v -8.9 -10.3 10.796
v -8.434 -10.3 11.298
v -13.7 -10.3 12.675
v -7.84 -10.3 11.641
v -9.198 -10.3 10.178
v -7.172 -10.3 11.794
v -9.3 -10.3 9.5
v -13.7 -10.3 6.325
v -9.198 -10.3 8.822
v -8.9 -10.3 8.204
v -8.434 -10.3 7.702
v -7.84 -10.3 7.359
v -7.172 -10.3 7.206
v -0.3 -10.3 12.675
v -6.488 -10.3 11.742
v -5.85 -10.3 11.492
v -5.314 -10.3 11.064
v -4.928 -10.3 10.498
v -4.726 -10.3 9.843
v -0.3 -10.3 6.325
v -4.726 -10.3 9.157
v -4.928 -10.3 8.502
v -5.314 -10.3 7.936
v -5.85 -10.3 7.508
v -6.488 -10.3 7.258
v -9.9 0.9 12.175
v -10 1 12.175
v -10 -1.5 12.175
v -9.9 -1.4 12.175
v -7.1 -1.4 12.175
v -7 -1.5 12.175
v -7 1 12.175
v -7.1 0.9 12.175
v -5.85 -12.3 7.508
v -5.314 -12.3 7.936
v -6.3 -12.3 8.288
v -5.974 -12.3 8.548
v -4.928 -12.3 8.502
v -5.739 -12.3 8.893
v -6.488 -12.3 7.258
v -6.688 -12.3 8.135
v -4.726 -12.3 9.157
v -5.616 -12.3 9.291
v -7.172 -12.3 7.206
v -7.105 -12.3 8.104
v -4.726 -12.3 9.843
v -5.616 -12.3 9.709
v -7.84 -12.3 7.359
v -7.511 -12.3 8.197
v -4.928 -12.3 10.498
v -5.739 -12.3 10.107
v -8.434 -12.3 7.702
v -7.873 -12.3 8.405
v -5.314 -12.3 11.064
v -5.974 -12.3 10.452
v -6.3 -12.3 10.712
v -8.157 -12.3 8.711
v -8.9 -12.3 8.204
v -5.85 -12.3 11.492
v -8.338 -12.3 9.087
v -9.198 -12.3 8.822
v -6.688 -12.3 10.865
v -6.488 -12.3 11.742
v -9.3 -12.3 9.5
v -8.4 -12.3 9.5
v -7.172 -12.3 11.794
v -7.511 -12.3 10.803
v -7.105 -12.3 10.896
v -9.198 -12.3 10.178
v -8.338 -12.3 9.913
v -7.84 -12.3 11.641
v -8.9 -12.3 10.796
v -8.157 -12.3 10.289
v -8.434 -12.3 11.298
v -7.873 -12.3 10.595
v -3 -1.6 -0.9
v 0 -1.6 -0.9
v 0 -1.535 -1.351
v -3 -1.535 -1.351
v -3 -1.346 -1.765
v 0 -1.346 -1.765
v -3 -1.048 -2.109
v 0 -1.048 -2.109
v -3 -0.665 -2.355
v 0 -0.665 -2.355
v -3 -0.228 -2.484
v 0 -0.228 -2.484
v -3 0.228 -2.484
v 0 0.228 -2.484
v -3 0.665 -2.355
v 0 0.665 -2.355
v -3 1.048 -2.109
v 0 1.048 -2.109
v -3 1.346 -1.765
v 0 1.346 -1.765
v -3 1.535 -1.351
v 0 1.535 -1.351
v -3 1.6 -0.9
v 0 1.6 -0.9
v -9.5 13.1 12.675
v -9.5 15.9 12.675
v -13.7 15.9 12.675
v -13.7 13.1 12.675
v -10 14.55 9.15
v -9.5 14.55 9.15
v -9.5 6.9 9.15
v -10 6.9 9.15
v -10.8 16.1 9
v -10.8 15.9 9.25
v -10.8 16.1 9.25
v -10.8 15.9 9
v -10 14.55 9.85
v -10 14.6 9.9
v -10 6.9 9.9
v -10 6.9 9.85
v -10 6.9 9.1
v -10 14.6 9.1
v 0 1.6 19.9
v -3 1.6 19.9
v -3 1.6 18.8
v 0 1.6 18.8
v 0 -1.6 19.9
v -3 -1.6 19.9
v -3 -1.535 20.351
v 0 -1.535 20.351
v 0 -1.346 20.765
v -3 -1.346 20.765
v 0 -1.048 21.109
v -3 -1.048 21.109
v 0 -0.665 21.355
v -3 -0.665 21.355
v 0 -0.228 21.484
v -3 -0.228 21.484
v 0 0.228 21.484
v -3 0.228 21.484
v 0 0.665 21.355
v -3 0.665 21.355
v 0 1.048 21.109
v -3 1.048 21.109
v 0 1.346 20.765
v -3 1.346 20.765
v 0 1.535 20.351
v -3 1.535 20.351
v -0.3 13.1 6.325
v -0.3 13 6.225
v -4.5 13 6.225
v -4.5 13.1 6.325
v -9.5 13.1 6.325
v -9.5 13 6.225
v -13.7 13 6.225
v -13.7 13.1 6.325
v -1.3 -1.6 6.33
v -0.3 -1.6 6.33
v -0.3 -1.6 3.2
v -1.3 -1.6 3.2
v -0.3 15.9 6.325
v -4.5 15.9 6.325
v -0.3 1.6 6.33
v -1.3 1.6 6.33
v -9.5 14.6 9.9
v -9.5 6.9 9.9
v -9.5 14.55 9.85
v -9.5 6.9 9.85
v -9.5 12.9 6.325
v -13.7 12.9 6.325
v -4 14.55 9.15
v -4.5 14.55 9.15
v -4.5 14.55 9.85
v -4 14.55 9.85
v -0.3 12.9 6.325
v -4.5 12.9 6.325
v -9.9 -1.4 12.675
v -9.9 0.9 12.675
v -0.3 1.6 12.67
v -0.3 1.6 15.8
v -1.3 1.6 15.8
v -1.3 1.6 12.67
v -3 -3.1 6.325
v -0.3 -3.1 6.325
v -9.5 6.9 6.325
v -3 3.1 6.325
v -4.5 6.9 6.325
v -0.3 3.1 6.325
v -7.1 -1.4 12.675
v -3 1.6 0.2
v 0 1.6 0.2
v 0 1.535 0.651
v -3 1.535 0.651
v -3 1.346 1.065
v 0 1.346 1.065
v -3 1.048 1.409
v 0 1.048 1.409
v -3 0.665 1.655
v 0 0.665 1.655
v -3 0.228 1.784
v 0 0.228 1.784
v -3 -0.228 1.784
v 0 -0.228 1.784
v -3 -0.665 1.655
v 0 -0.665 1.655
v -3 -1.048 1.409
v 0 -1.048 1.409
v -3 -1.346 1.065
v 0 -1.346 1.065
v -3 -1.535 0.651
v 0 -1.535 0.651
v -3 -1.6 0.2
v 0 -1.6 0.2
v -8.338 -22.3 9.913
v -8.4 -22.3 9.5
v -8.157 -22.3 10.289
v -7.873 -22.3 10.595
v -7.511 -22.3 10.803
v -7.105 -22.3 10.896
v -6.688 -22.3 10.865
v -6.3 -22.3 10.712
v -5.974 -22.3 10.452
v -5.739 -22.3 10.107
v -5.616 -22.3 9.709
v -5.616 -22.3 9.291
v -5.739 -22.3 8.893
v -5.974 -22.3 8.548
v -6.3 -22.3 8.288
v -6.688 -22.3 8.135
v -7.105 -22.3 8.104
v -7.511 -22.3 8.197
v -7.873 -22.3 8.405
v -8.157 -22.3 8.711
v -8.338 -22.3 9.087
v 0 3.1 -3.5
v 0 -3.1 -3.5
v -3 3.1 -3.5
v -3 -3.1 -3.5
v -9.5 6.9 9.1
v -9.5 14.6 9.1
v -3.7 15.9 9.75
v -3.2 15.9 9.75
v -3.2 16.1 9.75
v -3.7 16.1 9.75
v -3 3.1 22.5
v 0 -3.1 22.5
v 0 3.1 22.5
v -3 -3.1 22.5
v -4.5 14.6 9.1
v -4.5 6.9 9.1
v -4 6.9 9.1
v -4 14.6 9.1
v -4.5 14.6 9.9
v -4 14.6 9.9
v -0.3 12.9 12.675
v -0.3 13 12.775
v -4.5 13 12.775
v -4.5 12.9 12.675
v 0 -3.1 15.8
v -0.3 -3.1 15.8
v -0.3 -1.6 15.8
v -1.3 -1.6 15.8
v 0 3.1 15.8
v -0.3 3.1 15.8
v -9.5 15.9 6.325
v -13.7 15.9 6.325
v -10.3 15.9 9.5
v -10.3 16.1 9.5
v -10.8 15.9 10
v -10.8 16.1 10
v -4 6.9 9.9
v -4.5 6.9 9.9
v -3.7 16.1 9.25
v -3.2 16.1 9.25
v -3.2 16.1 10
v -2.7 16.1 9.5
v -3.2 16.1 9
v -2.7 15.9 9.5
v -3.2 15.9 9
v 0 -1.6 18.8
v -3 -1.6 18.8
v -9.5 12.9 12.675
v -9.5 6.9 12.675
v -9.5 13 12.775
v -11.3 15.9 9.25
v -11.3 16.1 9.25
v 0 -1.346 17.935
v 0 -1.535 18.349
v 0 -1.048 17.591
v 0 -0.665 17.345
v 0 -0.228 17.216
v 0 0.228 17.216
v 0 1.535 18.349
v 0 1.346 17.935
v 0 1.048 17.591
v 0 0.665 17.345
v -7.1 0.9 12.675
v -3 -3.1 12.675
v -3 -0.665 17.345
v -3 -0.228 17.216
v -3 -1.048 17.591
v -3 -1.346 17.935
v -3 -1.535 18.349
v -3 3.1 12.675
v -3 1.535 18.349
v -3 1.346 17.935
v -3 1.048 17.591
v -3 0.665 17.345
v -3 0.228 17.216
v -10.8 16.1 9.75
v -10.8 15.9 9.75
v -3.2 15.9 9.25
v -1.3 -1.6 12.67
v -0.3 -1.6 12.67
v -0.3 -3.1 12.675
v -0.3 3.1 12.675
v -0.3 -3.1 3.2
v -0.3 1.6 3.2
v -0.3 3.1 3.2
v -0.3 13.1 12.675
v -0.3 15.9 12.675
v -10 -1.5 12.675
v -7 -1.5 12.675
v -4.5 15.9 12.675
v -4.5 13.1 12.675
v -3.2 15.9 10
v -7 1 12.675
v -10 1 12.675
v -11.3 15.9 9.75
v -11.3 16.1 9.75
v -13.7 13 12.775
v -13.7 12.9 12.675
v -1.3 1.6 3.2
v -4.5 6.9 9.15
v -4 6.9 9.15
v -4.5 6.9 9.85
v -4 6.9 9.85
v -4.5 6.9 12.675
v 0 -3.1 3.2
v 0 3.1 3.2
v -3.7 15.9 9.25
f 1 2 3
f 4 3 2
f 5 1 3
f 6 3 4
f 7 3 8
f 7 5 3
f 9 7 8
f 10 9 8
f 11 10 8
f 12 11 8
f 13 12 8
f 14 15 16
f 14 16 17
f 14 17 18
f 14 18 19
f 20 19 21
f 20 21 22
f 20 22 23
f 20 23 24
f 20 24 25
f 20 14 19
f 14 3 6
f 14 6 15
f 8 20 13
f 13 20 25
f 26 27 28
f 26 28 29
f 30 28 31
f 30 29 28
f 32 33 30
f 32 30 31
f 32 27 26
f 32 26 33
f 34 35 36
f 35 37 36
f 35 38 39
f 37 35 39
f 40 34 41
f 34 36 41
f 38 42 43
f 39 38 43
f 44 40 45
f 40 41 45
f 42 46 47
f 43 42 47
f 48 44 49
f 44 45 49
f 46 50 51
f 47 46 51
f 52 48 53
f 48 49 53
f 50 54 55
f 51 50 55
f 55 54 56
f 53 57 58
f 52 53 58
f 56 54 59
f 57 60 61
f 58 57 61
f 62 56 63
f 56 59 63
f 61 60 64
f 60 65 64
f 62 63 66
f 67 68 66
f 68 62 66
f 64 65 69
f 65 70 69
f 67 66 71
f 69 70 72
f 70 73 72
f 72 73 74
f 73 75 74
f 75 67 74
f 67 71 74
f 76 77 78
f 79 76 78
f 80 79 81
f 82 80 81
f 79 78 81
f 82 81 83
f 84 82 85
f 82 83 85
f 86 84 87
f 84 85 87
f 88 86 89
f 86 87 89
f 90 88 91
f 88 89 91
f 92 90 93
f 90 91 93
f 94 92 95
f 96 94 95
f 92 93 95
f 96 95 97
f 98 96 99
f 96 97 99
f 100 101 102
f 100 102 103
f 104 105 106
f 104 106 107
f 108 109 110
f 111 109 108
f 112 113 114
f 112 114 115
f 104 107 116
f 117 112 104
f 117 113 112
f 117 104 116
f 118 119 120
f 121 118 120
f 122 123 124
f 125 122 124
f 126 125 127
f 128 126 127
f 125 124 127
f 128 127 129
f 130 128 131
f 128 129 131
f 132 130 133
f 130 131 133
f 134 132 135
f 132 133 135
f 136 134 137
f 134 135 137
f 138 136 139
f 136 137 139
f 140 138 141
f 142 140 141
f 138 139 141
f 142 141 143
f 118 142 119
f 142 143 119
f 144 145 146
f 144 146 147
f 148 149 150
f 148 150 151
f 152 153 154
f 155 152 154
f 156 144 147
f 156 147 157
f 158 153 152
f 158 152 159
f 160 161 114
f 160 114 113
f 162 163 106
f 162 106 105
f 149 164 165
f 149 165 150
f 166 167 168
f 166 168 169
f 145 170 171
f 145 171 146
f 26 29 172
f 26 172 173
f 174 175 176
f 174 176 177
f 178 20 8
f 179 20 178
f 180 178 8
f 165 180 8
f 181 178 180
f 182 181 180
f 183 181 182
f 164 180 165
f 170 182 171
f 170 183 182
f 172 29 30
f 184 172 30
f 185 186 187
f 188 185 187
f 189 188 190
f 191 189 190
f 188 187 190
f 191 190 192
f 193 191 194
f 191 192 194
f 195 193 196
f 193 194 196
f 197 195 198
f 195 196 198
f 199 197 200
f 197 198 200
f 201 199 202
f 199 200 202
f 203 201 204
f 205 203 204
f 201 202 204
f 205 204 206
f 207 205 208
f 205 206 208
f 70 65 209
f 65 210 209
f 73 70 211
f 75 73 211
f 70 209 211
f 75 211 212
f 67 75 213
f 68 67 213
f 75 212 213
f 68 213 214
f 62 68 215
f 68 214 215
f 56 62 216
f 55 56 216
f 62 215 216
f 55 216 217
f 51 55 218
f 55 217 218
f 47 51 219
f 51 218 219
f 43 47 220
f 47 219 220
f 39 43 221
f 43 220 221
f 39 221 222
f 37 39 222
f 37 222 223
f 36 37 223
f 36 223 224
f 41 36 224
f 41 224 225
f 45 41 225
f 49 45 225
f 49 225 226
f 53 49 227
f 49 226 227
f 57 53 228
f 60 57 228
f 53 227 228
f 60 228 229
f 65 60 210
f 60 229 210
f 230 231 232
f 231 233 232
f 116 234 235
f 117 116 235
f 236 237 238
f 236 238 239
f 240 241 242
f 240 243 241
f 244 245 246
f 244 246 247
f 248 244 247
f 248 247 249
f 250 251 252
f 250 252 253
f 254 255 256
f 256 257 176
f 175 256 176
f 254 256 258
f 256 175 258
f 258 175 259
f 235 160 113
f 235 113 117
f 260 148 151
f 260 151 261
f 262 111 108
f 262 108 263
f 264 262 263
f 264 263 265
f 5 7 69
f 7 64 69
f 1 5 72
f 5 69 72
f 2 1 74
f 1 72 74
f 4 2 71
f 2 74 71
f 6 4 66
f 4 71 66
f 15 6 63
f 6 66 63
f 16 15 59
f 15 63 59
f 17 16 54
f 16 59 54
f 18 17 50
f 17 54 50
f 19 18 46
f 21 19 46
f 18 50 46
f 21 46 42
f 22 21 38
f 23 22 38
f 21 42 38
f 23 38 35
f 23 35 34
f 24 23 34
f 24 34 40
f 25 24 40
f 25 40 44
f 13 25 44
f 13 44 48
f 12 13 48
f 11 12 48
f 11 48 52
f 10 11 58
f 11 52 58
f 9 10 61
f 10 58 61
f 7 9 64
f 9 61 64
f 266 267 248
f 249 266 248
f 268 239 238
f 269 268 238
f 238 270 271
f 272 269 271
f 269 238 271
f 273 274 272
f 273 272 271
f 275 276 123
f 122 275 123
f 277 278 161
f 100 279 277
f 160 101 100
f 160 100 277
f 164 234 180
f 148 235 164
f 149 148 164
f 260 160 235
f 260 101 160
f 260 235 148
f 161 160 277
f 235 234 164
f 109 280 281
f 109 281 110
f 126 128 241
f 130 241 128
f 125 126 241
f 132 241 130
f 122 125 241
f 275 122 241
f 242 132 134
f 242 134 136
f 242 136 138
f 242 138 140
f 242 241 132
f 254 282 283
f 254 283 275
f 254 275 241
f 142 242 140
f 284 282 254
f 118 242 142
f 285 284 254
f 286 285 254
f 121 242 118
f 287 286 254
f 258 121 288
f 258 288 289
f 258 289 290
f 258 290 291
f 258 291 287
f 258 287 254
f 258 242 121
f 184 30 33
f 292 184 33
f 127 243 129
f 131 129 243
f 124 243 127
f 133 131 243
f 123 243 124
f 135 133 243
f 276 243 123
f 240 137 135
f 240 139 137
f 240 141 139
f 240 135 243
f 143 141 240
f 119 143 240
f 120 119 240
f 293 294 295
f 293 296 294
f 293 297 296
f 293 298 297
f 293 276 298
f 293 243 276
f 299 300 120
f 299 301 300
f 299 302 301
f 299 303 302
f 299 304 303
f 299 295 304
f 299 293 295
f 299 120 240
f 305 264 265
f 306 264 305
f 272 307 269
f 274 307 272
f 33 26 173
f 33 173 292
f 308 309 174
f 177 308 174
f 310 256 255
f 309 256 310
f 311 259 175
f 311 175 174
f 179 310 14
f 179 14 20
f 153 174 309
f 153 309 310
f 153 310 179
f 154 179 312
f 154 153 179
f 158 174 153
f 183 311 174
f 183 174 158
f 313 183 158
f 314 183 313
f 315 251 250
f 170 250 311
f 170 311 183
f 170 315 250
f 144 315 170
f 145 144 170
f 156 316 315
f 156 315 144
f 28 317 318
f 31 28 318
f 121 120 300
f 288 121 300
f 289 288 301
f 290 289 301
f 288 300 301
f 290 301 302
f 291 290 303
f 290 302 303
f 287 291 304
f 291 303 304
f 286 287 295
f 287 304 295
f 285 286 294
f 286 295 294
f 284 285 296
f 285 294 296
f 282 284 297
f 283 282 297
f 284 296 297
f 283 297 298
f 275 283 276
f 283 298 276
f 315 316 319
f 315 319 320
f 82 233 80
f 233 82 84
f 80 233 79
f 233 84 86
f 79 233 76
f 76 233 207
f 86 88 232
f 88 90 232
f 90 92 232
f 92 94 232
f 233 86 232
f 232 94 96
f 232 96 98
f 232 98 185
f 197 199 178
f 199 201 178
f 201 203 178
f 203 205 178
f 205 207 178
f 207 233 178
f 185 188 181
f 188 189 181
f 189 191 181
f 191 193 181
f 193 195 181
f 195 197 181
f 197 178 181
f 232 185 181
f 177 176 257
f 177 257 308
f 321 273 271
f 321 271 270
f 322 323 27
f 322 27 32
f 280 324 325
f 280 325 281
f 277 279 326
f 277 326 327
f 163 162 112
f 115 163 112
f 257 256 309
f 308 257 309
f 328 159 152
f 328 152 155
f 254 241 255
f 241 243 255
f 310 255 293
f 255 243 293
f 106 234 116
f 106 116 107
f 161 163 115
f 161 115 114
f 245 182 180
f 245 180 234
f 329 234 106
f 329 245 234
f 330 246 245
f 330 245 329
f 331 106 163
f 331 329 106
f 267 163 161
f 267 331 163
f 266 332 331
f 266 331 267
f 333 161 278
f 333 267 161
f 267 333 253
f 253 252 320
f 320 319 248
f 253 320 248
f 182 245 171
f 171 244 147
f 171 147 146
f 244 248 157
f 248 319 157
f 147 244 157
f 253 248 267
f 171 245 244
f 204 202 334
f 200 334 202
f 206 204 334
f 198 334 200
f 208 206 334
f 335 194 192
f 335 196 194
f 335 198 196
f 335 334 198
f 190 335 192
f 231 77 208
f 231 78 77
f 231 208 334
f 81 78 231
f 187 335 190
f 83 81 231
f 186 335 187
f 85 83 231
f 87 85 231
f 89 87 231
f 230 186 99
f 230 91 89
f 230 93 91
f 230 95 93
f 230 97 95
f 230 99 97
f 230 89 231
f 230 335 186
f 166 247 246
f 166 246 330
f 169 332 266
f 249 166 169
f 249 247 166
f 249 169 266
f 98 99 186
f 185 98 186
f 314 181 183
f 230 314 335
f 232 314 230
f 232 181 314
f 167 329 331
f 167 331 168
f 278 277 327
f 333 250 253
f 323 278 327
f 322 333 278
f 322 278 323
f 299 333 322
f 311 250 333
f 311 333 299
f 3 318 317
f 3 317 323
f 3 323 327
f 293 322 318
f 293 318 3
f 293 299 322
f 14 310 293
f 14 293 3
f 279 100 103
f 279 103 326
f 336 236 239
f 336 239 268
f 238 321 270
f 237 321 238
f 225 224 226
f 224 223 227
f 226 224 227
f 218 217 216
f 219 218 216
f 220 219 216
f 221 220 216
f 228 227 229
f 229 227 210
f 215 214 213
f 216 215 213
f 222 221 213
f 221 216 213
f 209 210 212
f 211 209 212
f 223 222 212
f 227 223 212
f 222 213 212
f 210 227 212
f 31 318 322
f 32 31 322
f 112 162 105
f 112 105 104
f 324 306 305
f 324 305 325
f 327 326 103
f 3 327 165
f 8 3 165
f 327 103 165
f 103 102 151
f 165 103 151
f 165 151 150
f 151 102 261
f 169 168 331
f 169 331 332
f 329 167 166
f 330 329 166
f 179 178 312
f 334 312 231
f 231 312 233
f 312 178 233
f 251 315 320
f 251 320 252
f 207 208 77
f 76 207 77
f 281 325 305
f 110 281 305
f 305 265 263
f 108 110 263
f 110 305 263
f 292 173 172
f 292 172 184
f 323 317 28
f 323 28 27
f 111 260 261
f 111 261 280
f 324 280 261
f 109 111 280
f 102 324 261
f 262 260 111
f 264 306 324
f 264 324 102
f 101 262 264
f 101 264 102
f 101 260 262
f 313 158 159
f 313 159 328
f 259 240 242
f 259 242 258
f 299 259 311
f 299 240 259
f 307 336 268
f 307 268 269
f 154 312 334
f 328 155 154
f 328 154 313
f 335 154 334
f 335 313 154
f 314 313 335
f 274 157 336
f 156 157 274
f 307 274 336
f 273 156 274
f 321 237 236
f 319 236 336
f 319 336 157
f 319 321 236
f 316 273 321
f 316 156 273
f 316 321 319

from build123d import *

# Parameters (mm, degrees)
BOSS_EXTRUDE1_DEPTH  = 4.2
SKETCH2_W            = 6.35
SKETCH2_H            = 17.2
BOSS_EXTRUDE2_DEPTH  = 5
BOSS_EXTRUDE3_DEPTH  = 4.2
SKETCH4_W            = 0.8
SKETCH4_H            = 7.7
CUT_EXTRUDE1_DEPTH   = 0.5
SKETCH5_W            = 0.8
SKETCH5_H            = 7.7
CUT_EXTRUDE2_DEPTH   = 0.5
SKETCH6_W            = 2.7
SKETCH6_H            = 6.2
BOSS_EXTRUDE4_DEPTH  = 9.825
SKETCH7_W            = 6.7
SKETCH7_H            = 6.2
BOSS_EXTRUDE5_DEPTH  = 0.3
SKETCH8_W            = 3.13
SKETCH8_H            = 3.2
CUT_EXTRUDE3_DEPTH   = 1
SKETCH9_W            = 2.7
SKETCH9_H            = 6.2
BOSS_EXTRUDE6_DEPTH  = 9.825
SKETCH10_W           = 6.7
SKETCH10_H           = 6.2
BOSS_EXTRUDE7_DEPTH  = 0.3
SKETCH11_W           = 3.13
SKETCH11_H           = 3.2
CUT_EXTRUDE4_DEPTH   = 1
CUT_EXTRUDE5_DEPTH   = 30.55587928
CUT_EXTRUDE6_DEPTH   = 31.769302885
BOSS_EXTRUDE8_DEPTH  = 0.2
BOSS_EXTRUDE9_DEPTH  = 0.2
SKETCH16_W           = 3
SKETCH16_H           = 2.5
CUT_EXTRUDE7_DEPTH   = 0.5
SKETCH17_W           = 2.8
SKETCH17_H           = 2.3
BOSS_EXTRUDE10_DEPTH = 0.5
RIB1_START           = -0.35
RIB1_OUTLINE_W       = 0.5
RIB1_OUTLINE_H       = 7.65
RIB1_DEPTH           = 0.7
RIB2_START           = -0.35
RIB2_OUTLINE_W       = 0.5
RIB2_OUTLINE_H       = 7.65
RIB2_DEPTH           = 0.7


# Read off the part's stored shape, not the designer's step: Rib1, Rib2
with BuildPart() as part:
    # Sketch1 → Boss-Extrude1 (new body)
    with BuildSketch(Plane(origin=(-0.3, 0, 0), x_dir=(0, 0, -1), z_dir=(1, 0, 0))):
        Polygon((-12.775, 13), (-12.675, 12.9), (-12.675, -10.3), (-6.325, -10.3), (-6.325, 12.9), (-6.225, 13), (-6.325, 13.1), (-6.325, 15.9), (-12.675, 15.9), (-12.675, 13.1), align=None)
    extrude(amount=-BOSS_EXTRUDE1_DEPTH)

    # Sketch2 → Boss-Extrude2 (add)
    with BuildSketch(Plane.ZY.offset(4.5)):
        with Locations((9.5, -1.7)):
            Rectangle(SKETCH2_W, SKETCH2_H)
    extrude(amount=BOSS_EXTRUDE2_DEPTH)

    # Sketch3 → Boss-Extrude3 (add)
    with BuildSketch(Plane.ZY.offset(9.5)):
        Polygon((6.325, 13.1), (6.325, 15.9), (12.675, 15.9), (12.675, 13.1), (12.775, 13), (12.675, 12.9), (12.675, -10.3), (6.325, -10.3), (6.325, 12.9), (6.225, 13), align=None)
    extrude(amount=BOSS_EXTRUDE3_DEPTH)

    # Sketch4 → Cut-Extrude1 (cut)
    with BuildSketch(Plane(origin=(-9.5, 0, 0), x_dir=(0, 0, -1), z_dir=(1, 0, 0))):
        with Locations((-9.5, 10.75)):
            Rectangle(SKETCH4_W, SKETCH4_H)
    extrude(amount=-CUT_EXTRUDE1_DEPTH, mode=Mode.SUBTRACT)

    # Sketch5 → Cut-Extrude2 (cut)
    with BuildSketch(Plane.ZY.offset(4.5)):
        with Locations((9.5, 10.75)):
            Rectangle(SKETCH5_W, SKETCH5_H)
    extrude(amount=-CUT_EXTRUDE2_DEPTH, mode=Mode.SUBTRACT)

    # Sketch6 → Boss-Extrude4 (add)
    with BuildSketch(Plane.XY.offset(12.675)):
        with Locations((-1.65, 0)):
            Rectangle(SKETCH6_W, SKETCH6_H)
    extrude(amount=BOSS_EXTRUDE4_DEPTH)

    # Sketch7 → Boss-Extrude5 (add)
    with BuildSketch(Plane(origin=(-0.3, 0, 0), x_dir=(0, 0, -1), z_dir=(1, 0, 0))):
        with Locations((-19.15, 0)):
            Rectangle(SKETCH7_W, SKETCH7_H)
    extrude(amount=BOSS_EXTRUDE5_DEPTH)

    # Sketch8 → Cut-Extrude3 (cut)
    with BuildSketch(Plane(origin=(-0.3, 0, 0), x_dir=(0, 0, -1), z_dir=(1, 0, 0))):
        with Locations((-14.235, 0)):
            Rectangle(SKETCH8_W, SKETCH8_H)
    extrude(amount=-CUT_EXTRUDE3_DEPTH, mode=Mode.SUBTRACT)

    # Sketch9 → Boss-Extrude6 (add)
    with BuildSketch(Plane(origin=(0, 0, 6.325), x_dir=(-1, 0, 0), z_dir=(0, 0, -1))):
        with Locations((1.65, 0)):
            Rectangle(SKETCH9_W, SKETCH9_H)
    extrude(amount=BOSS_EXTRUDE6_DEPTH)

    # Sketch10 → Boss-Extrude7 (add)
    with BuildSketch(Plane(origin=(-0.3, 0, 0), x_dir=(0, 0, -1), z_dir=(1, 0, 0))):
        with Locations((0.15, 0)):
            Rectangle(SKETCH10_W, SKETCH10_H)
    extrude(amount=BOSS_EXTRUDE7_DEPTH)

    # Sketch11 → Cut-Extrude4 (cut)
    with BuildSketch(Plane(origin=(-0.3, 0, 0), x_dir=(0, 0, -1), z_dir=(1, 0, 0))):
        with Locations((-4.765, 0)):
            Rectangle(SKETCH11_W, SKETCH11_H)
    extrude(amount=-CUT_EXTRUDE4_DEPTH, mode=Mode.SUBTRACT)

    # Sketch12 → Cut-Extrude5 (cut, through all)
    with BuildSketch(Plane.ZY.offset(3)):
        with BuildLine():
            Line((18.8, -1.6), (19.9, -1.6))
            ThreePointArc((19.9, -1.6), (21.5, 0), (19.9, 1.6))
            Line((19.9, 1.6), (18.8, 1.6))
            ThreePointArc((18.8, 1.6), (17.2, 0), (18.8, -1.6))
        make_face()
    extrude(amount=-CUT_EXTRUDE5_DEPTH, mode=Mode.SUBTRACT)

    # Sketch13 → Cut-Extrude6 (cut, through all)
    with BuildSketch(Plane(origin=(0, 0, 0), x_dir=(0, 0, -1), z_dir=(1, 0, 0))):
        with BuildLine():
            Line((-0.2, -1.6), (0.9, -1.6))
            ThreePointArc((0.9, -1.6), (2.5, 0), (0.9, 1.6))
            Line((0.9, 1.6), (-0.2, 1.6))
            ThreePointArc((-0.2, 1.6), (-1.8, 0), (-0.2, -1.6))
        make_face()
    extrude(amount=-CUT_EXTRUDE6_DEPTH, mode=Mode.SUBTRACT)

    # Sketch14 → Boss-Extrude8 (add)
    with BuildSketch(Plane(origin=(0, 15.9, 0), x_dir=(-1, 0, 0), z_dir=(0, 1, 0))):
        Polygon((10.8, 10), (10.8, 9.75), (11.3, 9.75), (11.3, 9.25), (10.8, 9.25), (10.8, 9), (10.3, 9.5), align=None)
    extrude(amount=BOSS_EXTRUDE8_DEPTH)

    # Sketch15 → Boss-Extrude9 (add)
    with BuildSketch(Plane(origin=(0, 15.9, 0), x_dir=(-1, 0, 0), z_dir=(0, 1, 0))):
        Polygon((3.2, 10), (3.2, 9.75), (3.7, 9.75), (3.7, 9.25), (3.2, 9.25), (3.2, 9), (2.7, 9.5), align=None)
    extrude(amount=BOSS_EXTRUDE9_DEPTH)

    # Sketch16 → Cut-Extrude7 (cut)
    with BuildSketch(Plane.XY.offset(12.675)):
        with Locations((-8.5, -0.25)):
            Rectangle(SKETCH16_W, SKETCH16_H)
    extrude(amount=-CUT_EXTRUDE7_DEPTH, mode=Mode.SUBTRACT)

    # Sketch17 → Boss-Extrude10 (add)
    with BuildSketch(Plane.XY.offset(12.175)):
        with Locations((-8.5, -0.25)):
            Rectangle(SKETCH17_W, SKETCH17_H)
    extrude(amount=BOSS_EXTRUDE10_DEPTH)

    # Sketch18 → Revolve1 (revolve)
    with BuildSketch(Plane(origin=(0, 0, 9.5), x_dir=(-1, 0, 0), z_dir=(0, 0, -1)), mode=Mode.PRIVATE) as revolve1_sk:
        Polygon((5.6, -22.3), (7, -22.3), (7, -10.3), (4.7, -10.3), (4.7, -12.3), (5.6, -12.3), align=None)
    revolve(revolve1_sk.sketch.rotate(Axis((-7, -22.3, 9.5), (0, 1, 0)), 180), axis=Axis((-7, -22.3, 9.5), (0, 1, 0)))

    # Rib1 outline → Rib1 (add)
    with BuildSketch(Plane(origin=(0, 0, 9.5), x_dir=(-1, 0, 0), z_dir=(0, 0, -1)).offset(RIB1_START)):
        with Locations((9.75, 10.725)):
            Rectangle(RIB1_OUTLINE_W, RIB1_OUTLINE_H)
    extrude(amount=RIB1_DEPTH)

    # Rib2 outline → Rib2 (add)
    with BuildSketch(Plane.XY.offset(9.5).offset(RIB2_START)):
        with Locations((-4.25, 10.725)):
            Rectangle(RIB2_OUTLINE_W, RIB2_OUTLINE_H)
    extrude(amount=RIB2_DEPTH)


solid = part.part
